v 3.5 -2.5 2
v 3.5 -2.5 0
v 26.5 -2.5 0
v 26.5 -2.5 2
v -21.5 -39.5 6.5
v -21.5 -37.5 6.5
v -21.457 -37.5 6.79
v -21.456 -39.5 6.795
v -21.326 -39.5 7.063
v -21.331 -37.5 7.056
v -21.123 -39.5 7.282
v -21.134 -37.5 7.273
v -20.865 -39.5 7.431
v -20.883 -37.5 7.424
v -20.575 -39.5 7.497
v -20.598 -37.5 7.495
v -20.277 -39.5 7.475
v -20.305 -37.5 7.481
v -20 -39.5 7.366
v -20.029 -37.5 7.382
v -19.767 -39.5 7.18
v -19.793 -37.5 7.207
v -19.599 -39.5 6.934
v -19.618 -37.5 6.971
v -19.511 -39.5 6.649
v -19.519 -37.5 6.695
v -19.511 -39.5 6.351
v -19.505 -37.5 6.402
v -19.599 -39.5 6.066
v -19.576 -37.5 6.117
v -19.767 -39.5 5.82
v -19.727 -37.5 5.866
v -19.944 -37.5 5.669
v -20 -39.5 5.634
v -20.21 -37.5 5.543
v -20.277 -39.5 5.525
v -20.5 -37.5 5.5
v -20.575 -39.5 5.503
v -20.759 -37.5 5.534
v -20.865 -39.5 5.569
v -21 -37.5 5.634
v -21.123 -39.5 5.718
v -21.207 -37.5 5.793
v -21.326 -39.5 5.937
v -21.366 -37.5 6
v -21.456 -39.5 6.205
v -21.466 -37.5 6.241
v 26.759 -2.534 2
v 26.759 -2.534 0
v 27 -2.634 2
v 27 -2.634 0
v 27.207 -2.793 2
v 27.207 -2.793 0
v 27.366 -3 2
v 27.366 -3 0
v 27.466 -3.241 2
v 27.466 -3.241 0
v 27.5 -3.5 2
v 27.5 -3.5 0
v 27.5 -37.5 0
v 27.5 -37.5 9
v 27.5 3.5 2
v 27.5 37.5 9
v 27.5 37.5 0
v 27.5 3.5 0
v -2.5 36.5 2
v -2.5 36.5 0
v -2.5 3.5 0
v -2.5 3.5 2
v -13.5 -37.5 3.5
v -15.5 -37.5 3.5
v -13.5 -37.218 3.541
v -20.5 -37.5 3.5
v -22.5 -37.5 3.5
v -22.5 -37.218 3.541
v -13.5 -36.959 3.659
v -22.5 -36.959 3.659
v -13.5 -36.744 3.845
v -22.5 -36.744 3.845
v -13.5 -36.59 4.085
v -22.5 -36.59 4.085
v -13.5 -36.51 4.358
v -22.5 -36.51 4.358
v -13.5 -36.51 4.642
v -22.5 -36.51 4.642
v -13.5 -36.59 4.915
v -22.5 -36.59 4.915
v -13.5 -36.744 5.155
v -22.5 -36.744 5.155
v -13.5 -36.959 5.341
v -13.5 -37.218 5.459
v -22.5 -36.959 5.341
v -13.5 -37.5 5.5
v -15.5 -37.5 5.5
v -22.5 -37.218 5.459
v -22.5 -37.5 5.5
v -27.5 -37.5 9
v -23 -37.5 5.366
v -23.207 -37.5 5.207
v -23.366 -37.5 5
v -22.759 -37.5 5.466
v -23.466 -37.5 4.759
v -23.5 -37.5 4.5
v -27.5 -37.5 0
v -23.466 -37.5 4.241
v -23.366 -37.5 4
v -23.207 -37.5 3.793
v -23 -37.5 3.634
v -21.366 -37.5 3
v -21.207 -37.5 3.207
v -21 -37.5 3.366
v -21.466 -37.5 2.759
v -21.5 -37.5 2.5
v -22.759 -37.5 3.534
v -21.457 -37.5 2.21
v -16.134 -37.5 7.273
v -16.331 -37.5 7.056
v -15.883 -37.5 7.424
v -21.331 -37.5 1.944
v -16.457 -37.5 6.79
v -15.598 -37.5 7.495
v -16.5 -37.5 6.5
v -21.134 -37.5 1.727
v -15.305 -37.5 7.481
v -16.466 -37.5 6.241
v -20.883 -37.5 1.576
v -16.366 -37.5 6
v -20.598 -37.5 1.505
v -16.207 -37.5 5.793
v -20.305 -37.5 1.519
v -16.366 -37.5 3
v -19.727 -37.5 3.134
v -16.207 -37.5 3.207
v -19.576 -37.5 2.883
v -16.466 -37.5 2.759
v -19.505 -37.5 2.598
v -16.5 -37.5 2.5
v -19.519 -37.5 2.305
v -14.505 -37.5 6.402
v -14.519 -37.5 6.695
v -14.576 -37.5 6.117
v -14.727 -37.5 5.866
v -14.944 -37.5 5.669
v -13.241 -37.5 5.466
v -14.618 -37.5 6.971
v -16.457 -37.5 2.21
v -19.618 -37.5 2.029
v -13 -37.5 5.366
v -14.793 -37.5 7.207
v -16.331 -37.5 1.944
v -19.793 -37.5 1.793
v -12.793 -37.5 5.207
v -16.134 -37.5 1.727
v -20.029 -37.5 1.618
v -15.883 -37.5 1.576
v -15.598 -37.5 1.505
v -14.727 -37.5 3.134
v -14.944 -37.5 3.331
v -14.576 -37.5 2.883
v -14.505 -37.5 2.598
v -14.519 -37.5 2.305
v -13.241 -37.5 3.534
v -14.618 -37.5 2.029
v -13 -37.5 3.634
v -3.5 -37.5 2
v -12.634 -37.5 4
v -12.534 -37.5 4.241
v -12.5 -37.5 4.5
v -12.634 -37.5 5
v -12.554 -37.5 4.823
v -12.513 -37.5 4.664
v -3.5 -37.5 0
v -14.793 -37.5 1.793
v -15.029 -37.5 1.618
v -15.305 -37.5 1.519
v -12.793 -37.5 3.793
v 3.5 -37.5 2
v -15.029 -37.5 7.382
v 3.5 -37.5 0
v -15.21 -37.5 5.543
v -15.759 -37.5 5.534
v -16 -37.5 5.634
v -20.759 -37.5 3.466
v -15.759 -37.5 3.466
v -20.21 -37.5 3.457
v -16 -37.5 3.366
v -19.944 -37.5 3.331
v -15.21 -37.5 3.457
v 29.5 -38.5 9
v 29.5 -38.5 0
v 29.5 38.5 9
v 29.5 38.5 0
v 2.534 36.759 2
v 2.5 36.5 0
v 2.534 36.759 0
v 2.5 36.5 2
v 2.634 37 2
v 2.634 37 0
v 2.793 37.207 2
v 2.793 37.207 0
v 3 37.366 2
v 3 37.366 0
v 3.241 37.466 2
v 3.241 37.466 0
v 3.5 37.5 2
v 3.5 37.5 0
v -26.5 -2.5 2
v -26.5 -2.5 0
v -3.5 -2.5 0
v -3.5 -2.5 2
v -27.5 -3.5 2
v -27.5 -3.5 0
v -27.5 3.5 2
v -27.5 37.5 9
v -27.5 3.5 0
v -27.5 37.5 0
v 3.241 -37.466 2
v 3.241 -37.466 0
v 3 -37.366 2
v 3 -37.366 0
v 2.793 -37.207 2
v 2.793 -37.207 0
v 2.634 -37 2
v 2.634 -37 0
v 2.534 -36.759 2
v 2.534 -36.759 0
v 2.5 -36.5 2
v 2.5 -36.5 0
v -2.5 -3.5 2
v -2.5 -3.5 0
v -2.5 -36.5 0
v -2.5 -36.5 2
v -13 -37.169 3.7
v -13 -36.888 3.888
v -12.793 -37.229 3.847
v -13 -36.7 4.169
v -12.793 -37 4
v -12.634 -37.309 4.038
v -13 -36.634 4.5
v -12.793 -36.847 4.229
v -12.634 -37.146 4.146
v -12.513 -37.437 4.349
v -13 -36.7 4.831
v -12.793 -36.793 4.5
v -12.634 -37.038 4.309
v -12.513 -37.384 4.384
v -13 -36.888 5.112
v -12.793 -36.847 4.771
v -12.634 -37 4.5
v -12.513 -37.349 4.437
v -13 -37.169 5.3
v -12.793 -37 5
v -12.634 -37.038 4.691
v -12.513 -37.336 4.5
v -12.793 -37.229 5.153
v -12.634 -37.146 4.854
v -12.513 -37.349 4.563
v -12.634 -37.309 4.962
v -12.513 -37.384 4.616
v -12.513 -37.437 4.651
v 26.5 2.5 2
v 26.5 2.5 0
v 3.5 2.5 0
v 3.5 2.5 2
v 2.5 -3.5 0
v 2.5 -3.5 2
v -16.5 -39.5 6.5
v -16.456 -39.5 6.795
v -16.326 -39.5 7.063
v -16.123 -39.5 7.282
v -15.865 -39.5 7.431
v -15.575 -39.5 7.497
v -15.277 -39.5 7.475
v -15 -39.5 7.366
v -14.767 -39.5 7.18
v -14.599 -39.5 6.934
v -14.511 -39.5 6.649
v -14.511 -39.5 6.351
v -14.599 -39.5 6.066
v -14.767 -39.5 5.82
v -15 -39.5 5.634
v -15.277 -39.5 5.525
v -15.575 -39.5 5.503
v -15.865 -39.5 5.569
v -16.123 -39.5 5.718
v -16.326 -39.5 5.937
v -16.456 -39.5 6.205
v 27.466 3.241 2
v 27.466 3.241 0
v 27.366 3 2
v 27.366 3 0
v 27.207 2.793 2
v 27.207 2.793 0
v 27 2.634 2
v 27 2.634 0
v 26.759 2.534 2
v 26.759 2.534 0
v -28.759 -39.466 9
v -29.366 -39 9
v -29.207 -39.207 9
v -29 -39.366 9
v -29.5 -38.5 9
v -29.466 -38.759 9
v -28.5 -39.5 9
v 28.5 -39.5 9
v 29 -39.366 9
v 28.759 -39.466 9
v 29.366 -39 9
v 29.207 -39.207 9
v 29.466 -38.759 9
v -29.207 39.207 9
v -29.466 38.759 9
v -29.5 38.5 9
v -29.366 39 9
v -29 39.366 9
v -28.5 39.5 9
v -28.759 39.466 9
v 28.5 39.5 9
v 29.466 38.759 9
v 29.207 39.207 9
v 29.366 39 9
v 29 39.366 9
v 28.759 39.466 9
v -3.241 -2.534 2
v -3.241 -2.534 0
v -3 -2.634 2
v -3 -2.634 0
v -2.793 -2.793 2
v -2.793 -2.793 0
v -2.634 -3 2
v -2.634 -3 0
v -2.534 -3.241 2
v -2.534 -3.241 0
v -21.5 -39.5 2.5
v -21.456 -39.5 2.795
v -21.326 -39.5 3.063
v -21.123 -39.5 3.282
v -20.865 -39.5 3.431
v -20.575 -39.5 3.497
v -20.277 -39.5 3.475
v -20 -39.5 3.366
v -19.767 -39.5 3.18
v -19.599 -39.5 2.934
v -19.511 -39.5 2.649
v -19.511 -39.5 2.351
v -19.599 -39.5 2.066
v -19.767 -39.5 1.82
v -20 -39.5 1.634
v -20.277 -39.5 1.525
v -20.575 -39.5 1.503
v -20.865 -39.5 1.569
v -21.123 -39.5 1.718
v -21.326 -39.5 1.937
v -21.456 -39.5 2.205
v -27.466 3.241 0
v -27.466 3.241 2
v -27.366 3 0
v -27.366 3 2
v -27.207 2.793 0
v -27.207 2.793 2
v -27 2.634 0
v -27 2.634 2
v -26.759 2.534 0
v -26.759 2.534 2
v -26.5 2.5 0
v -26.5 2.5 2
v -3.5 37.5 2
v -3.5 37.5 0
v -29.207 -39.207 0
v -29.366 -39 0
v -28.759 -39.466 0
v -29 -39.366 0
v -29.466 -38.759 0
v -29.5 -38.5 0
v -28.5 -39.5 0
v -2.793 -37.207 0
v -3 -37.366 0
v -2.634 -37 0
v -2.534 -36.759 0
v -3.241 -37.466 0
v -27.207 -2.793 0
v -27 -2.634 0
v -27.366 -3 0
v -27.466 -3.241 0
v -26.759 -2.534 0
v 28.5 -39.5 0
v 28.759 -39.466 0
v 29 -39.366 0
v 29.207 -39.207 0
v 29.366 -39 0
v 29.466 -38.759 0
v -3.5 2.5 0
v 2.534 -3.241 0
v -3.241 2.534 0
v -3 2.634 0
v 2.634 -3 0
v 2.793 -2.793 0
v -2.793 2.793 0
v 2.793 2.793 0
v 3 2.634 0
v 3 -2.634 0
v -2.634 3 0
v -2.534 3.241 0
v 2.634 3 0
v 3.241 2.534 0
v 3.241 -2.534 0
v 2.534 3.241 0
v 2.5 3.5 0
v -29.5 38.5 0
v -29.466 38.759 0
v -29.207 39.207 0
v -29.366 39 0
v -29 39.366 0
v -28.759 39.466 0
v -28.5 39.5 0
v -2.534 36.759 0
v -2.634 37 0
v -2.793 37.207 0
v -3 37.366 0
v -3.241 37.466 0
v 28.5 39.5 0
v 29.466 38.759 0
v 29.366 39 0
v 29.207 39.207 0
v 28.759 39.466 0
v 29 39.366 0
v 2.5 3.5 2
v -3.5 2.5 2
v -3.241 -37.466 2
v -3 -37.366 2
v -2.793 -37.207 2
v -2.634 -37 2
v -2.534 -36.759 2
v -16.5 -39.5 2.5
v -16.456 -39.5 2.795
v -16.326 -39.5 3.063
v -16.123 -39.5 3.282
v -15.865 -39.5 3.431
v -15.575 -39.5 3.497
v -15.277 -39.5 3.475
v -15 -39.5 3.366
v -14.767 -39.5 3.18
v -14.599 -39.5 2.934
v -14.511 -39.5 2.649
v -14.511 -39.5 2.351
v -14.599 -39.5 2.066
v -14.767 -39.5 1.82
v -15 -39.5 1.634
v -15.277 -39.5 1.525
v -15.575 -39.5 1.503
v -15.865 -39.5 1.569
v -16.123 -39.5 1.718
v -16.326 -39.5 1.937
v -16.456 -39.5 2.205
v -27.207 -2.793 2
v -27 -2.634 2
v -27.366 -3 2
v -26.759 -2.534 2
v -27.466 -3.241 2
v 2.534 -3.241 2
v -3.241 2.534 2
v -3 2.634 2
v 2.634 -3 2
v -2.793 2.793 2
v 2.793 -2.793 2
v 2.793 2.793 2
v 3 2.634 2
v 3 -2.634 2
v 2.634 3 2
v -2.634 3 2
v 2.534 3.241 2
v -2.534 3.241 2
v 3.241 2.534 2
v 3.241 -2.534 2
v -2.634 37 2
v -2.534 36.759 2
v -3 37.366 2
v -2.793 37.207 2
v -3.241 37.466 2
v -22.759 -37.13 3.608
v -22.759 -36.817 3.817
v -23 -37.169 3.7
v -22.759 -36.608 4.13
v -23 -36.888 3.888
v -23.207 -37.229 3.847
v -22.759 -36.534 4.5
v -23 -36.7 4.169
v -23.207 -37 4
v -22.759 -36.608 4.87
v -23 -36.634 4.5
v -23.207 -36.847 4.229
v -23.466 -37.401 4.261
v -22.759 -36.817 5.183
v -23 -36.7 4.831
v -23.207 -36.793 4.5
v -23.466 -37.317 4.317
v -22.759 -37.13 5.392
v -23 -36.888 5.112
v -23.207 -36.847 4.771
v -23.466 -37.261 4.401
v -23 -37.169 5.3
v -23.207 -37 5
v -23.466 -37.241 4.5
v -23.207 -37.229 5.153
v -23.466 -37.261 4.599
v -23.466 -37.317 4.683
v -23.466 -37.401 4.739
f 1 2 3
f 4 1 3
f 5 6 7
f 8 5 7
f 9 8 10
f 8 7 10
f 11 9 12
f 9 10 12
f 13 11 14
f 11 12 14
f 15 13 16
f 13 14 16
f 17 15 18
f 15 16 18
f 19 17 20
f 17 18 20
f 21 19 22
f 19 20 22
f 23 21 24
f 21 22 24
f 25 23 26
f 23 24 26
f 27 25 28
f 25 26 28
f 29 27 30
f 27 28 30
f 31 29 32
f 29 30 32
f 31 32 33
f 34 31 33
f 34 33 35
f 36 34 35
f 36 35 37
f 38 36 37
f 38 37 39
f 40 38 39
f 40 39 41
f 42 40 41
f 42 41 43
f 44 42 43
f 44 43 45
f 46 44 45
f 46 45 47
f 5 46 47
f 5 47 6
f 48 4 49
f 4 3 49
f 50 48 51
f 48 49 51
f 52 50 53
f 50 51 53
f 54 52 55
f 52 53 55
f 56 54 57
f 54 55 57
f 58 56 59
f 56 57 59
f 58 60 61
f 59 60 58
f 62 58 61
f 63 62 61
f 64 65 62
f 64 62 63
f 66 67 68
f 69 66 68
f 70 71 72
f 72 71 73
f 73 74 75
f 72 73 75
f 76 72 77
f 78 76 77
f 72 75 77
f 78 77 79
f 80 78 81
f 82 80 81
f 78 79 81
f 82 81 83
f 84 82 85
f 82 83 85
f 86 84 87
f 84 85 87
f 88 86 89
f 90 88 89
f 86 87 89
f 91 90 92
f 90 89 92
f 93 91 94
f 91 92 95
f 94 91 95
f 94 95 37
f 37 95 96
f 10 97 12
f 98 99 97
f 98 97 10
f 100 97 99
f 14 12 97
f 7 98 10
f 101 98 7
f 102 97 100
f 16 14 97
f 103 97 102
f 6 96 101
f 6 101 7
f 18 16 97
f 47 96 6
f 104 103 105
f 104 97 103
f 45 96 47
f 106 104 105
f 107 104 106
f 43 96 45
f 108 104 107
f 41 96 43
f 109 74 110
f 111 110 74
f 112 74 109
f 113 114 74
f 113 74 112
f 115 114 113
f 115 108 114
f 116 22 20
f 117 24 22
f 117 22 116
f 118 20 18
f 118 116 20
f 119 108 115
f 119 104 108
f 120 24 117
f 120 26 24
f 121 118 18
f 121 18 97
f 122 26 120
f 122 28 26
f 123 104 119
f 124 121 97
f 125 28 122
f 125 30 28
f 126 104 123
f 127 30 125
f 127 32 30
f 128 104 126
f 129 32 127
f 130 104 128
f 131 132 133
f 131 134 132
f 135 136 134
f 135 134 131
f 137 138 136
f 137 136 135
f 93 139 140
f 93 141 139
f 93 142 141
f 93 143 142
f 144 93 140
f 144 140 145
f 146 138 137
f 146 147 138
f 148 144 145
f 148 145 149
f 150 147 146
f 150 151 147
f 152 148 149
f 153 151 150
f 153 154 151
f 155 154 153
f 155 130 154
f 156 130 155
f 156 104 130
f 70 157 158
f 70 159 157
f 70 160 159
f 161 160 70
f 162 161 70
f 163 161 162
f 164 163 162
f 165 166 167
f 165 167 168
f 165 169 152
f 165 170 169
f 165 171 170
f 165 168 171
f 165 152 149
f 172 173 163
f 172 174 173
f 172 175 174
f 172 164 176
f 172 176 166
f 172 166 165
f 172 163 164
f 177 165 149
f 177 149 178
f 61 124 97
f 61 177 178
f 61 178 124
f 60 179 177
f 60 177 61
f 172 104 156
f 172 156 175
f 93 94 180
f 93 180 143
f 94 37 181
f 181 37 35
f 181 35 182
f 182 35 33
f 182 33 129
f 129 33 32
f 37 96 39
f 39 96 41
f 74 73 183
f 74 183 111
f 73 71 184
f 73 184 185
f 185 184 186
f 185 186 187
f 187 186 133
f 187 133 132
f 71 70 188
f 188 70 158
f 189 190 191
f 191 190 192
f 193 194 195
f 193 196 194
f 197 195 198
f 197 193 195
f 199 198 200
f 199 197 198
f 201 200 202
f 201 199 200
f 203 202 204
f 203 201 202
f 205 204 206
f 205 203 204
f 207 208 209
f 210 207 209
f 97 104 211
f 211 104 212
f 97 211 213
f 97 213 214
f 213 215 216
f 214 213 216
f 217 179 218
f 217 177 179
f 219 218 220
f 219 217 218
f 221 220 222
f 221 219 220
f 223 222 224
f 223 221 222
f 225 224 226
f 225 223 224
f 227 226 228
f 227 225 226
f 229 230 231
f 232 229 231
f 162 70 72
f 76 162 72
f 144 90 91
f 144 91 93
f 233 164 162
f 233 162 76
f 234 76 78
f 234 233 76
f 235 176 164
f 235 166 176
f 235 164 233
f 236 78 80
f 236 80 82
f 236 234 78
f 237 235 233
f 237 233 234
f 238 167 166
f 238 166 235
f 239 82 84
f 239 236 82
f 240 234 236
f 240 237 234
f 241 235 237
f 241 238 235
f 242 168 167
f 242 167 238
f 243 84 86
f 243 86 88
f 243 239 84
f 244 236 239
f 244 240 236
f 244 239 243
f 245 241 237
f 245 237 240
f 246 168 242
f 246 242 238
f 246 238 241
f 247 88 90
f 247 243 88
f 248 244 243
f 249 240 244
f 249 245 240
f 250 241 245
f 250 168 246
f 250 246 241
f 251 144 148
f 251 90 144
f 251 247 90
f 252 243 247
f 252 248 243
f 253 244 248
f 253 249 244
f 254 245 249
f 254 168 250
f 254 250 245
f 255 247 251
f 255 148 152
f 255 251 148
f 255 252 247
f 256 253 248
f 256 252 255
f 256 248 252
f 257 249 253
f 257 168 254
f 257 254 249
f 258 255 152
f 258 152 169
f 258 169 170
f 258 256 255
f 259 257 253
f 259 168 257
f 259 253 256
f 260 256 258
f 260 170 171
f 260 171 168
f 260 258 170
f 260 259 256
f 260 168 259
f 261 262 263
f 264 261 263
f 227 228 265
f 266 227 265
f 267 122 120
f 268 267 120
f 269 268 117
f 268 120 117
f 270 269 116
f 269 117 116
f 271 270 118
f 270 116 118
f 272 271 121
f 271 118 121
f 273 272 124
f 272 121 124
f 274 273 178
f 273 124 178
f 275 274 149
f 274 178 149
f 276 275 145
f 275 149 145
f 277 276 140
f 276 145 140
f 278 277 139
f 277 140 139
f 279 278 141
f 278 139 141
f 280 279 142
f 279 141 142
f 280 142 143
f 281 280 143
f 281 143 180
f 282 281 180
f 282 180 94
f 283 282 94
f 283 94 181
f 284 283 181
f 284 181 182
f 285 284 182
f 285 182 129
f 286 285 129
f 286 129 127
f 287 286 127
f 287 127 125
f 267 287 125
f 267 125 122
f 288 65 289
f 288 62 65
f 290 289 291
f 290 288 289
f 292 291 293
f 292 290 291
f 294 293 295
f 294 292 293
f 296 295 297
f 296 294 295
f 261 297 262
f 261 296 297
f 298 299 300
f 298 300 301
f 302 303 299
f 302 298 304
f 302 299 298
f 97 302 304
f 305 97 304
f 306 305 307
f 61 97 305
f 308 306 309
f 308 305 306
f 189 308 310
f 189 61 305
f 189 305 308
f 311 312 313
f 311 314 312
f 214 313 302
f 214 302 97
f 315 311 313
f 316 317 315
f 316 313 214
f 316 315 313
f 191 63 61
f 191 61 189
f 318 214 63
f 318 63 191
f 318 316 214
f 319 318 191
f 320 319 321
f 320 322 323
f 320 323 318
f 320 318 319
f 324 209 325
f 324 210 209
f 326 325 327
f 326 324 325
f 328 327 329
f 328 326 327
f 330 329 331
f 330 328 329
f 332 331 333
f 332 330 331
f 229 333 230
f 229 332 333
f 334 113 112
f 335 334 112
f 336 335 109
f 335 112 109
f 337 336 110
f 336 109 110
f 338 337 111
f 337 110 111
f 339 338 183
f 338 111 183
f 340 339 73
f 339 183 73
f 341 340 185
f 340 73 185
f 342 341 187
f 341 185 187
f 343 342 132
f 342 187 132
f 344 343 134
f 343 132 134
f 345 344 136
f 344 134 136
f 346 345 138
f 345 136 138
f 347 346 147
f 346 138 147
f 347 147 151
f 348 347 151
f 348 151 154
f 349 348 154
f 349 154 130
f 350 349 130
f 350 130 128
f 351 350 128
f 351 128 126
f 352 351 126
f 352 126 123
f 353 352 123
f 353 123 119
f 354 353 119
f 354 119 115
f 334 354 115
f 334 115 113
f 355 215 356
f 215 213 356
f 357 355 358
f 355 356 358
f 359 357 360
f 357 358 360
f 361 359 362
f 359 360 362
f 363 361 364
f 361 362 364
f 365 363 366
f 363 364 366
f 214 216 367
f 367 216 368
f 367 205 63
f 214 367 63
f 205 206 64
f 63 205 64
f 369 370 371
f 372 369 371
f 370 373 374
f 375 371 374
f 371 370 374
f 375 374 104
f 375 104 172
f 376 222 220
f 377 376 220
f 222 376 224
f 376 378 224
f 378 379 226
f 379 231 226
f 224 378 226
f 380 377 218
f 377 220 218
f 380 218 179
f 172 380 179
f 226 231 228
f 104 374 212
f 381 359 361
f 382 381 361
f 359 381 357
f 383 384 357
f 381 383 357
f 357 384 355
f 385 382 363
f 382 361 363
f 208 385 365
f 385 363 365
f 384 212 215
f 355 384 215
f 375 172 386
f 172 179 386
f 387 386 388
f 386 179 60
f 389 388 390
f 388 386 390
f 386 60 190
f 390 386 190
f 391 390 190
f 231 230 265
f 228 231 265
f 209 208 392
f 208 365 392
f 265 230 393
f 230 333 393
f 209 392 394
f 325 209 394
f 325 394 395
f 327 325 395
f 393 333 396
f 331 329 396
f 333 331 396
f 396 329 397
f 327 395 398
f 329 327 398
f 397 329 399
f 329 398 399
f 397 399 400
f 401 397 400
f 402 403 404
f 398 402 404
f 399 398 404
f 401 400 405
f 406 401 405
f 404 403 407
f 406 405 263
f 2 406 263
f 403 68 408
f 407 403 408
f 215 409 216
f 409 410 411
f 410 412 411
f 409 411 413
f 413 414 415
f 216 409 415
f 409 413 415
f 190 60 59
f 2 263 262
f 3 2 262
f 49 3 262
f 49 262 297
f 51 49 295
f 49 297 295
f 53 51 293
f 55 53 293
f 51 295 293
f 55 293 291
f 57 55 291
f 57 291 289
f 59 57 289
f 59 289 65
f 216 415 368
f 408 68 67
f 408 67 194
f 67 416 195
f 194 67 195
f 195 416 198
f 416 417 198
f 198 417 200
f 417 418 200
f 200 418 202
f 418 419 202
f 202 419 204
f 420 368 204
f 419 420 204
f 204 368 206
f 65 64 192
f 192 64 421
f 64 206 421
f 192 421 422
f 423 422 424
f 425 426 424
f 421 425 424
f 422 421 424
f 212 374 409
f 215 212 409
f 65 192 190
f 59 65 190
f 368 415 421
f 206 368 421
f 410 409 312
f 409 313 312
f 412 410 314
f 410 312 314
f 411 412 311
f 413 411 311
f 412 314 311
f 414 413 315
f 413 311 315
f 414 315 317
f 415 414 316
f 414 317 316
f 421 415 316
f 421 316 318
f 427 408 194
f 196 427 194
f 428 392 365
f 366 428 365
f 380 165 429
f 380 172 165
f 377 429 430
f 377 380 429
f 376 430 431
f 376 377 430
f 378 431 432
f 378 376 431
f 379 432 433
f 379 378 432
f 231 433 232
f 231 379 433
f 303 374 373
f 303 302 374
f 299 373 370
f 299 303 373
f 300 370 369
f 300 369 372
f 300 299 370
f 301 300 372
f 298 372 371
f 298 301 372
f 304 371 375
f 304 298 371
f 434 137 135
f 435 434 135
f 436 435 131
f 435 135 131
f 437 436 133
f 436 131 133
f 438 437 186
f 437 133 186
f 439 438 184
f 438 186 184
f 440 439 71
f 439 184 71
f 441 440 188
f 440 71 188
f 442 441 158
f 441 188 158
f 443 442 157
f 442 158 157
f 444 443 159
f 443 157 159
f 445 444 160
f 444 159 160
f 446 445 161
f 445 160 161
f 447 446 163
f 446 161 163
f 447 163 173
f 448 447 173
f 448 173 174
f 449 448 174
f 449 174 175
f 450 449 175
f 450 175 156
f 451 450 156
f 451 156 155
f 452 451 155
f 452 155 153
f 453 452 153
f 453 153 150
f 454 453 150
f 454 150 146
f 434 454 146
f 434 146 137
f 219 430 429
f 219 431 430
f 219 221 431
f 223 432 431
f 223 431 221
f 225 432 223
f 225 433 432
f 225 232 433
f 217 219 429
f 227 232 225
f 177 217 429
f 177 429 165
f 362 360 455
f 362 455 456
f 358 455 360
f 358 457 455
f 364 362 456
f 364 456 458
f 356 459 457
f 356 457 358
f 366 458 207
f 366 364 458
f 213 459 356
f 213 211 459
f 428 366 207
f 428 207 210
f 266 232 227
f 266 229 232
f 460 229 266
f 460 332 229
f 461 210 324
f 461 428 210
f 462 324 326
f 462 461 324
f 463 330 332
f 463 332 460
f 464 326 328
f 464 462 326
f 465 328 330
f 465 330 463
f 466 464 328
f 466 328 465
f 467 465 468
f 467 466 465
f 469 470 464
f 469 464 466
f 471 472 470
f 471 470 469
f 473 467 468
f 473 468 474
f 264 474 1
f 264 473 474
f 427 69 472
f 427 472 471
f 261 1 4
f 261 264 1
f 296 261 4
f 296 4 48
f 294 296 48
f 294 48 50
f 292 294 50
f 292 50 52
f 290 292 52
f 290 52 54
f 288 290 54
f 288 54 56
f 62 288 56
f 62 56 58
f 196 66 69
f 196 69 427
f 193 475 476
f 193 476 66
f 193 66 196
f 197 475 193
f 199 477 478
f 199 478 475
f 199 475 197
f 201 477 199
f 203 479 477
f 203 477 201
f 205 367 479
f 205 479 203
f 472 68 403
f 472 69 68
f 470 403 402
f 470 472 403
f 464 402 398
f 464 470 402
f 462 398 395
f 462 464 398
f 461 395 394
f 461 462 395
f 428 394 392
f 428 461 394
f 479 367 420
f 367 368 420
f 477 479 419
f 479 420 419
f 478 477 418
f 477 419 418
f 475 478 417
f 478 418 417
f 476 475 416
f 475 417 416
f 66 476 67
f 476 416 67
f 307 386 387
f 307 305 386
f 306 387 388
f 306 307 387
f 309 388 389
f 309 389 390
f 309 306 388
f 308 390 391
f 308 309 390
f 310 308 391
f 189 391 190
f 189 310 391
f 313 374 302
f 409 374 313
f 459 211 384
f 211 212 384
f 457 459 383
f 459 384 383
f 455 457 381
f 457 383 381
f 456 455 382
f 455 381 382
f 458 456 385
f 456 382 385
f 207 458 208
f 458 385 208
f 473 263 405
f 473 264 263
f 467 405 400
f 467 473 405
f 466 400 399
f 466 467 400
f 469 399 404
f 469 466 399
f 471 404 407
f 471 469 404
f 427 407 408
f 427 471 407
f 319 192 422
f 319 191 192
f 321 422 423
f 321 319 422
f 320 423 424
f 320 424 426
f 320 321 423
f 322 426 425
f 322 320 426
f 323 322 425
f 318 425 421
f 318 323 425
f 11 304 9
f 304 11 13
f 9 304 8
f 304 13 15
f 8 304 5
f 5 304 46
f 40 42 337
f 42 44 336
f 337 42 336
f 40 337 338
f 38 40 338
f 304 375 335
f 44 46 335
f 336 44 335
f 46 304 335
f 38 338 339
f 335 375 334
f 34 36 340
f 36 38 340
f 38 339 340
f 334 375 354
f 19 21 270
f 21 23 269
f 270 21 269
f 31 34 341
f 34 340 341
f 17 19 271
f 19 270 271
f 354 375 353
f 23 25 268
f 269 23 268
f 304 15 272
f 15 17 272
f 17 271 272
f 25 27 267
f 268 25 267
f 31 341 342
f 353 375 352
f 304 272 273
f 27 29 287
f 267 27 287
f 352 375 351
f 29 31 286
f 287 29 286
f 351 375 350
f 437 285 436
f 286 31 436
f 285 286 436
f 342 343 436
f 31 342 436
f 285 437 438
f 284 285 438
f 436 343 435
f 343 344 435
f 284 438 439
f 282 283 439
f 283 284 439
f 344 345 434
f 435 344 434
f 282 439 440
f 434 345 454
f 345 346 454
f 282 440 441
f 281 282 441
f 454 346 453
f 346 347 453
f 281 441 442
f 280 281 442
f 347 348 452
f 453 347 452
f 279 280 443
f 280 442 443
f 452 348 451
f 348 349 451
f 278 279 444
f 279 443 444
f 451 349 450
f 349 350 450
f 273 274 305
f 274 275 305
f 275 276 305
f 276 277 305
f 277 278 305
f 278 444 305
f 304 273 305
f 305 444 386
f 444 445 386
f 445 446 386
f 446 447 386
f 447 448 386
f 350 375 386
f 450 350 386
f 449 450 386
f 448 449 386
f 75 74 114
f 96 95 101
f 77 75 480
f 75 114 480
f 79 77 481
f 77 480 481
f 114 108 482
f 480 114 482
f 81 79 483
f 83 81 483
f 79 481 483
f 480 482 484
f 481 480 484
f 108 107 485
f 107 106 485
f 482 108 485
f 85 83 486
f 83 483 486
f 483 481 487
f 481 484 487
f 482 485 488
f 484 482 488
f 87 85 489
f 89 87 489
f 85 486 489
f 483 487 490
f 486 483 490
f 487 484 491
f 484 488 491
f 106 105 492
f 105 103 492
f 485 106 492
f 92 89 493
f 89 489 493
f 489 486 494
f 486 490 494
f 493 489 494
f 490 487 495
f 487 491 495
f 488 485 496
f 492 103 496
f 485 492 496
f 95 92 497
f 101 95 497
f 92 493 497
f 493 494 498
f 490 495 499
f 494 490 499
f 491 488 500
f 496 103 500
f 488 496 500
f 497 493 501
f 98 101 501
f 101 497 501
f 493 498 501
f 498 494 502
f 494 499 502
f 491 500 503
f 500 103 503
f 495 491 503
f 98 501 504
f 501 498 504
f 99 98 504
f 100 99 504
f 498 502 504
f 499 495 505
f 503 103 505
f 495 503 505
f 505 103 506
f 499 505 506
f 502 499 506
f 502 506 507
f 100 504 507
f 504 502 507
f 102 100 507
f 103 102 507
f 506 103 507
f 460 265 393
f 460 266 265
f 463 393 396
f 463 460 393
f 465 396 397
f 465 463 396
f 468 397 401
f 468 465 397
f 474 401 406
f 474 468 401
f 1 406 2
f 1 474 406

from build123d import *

# Parameters (mm, degrees)
F0_W     = 59
F0_H     = 79
F0_W_2   = 55
F0_H_2   = 75
F1_DEPTH = 9
F3_DEPTH = 2
F4_R     = 1
F5_DEPTH = 2.001
F6_R     = 1
F9_DEPTH = 11
F10_R    = 0.99999


# Not quite as in the source:
# - two fillets or chamfers of one size are made in one step
# - a fillet or chamfer is up to 0.001 mm smaller than in the source, because OpenCascade refuses the exact size


with BuildPart() as f1:
    # F0 (on Top) → F1 (new body)
    with BuildSketch(Plane.XY):
        Rectangle(F0_W, F0_H)
        Rectangle(F0_W_2, F0_H_2, mode=Mode.SUBTRACT)
    extrude(amount=F1_DEPTH)

    # F2 (on Top) → F3 (join)
    with BuildSketch(Plane.XY):
        Polygon((2.5, 38.5), (-2.5, 38.5), (-2.5, 2.5), (-28.5, 2.5), (-28.5, -2.5), (-2.5, -2.5), (-2.5, -38.5), (2.5, -38.5), (2.5, -2.5), (28.5, -2.5), (28.5, 2.5), (2.5, 2.5), align=None)
    extrude(amount=F3_DEPTH)

    # F4 (on face) → F5 (cut, through all)
    with BuildSketch(Plane(origin=(0, -37.5, 0), x_dir=(-1, 0, 0), z_dir=(0, 1, 0))):
        with Locations((20.5, 2.5)):
            Circle(F4_R)
        with Locations((20.5, 6.5)):
            Circle(F4_R)
        with Locations((15.5, 2.5)):
            Circle(F4_R)
        with Locations((15.5, 6.5)):
            Circle(F4_R)
    extrude(amount=-F5_DEPTH, mode=Mode.SUBTRACT)

    # F6
    f6_edges = [f1.edges().sort_by_distance(p)[0] for p in [
        (-29.5, -39.5, 4.5),
        (29.5, -39.5, 4.5),
        (-29.5, 39.5, 4.5),
        (29.5, 39.5, 4.5),
        (-2.5, 2.5, 1),
        (2.5, 2.5, 1),
        (2.5, -2.5, 1),
        (-2.5, -2.5, 1),
        (2.5, -37.5, 1),
        (-2.5, -37.5, 1),
        (-27.5, -2.5, 1),
        (-27.5, 2.5, 1),
        (27.5, -2.5, 1),
        (27.5, 2.5, 1),
        (2.5, 37.5, 1),
        (-2.5, 37.5, 1),
    ]]
    fillet(f6_edges, radius=F6_R)

    # F8 (on offset) → F9 (join)
    with BuildSketch(Plane.YZ.offset(-23.5)):
        with BuildLine():
            ThreePointArc((-37.5, 3.5), (-36.5, 4.5), (-37.5, 5.5))
            Line((-37.5, 5.5), (-37.5, 3.5))
        make_face()
    extrude(amount=F9_DEPTH)

    # F10 (radius 1 in the source; OpenCascade refuses exactly that, so slightly less here)
    f10_edges = [f1.edges().sort_by_distance(p)[0] for p in [
        (-23.5, -36.5, 4.5),
        (-12.5, -36.5, 4.5),
    ]]
    fillet(f10_edges, radius=F10_R)


solid = f1.part
